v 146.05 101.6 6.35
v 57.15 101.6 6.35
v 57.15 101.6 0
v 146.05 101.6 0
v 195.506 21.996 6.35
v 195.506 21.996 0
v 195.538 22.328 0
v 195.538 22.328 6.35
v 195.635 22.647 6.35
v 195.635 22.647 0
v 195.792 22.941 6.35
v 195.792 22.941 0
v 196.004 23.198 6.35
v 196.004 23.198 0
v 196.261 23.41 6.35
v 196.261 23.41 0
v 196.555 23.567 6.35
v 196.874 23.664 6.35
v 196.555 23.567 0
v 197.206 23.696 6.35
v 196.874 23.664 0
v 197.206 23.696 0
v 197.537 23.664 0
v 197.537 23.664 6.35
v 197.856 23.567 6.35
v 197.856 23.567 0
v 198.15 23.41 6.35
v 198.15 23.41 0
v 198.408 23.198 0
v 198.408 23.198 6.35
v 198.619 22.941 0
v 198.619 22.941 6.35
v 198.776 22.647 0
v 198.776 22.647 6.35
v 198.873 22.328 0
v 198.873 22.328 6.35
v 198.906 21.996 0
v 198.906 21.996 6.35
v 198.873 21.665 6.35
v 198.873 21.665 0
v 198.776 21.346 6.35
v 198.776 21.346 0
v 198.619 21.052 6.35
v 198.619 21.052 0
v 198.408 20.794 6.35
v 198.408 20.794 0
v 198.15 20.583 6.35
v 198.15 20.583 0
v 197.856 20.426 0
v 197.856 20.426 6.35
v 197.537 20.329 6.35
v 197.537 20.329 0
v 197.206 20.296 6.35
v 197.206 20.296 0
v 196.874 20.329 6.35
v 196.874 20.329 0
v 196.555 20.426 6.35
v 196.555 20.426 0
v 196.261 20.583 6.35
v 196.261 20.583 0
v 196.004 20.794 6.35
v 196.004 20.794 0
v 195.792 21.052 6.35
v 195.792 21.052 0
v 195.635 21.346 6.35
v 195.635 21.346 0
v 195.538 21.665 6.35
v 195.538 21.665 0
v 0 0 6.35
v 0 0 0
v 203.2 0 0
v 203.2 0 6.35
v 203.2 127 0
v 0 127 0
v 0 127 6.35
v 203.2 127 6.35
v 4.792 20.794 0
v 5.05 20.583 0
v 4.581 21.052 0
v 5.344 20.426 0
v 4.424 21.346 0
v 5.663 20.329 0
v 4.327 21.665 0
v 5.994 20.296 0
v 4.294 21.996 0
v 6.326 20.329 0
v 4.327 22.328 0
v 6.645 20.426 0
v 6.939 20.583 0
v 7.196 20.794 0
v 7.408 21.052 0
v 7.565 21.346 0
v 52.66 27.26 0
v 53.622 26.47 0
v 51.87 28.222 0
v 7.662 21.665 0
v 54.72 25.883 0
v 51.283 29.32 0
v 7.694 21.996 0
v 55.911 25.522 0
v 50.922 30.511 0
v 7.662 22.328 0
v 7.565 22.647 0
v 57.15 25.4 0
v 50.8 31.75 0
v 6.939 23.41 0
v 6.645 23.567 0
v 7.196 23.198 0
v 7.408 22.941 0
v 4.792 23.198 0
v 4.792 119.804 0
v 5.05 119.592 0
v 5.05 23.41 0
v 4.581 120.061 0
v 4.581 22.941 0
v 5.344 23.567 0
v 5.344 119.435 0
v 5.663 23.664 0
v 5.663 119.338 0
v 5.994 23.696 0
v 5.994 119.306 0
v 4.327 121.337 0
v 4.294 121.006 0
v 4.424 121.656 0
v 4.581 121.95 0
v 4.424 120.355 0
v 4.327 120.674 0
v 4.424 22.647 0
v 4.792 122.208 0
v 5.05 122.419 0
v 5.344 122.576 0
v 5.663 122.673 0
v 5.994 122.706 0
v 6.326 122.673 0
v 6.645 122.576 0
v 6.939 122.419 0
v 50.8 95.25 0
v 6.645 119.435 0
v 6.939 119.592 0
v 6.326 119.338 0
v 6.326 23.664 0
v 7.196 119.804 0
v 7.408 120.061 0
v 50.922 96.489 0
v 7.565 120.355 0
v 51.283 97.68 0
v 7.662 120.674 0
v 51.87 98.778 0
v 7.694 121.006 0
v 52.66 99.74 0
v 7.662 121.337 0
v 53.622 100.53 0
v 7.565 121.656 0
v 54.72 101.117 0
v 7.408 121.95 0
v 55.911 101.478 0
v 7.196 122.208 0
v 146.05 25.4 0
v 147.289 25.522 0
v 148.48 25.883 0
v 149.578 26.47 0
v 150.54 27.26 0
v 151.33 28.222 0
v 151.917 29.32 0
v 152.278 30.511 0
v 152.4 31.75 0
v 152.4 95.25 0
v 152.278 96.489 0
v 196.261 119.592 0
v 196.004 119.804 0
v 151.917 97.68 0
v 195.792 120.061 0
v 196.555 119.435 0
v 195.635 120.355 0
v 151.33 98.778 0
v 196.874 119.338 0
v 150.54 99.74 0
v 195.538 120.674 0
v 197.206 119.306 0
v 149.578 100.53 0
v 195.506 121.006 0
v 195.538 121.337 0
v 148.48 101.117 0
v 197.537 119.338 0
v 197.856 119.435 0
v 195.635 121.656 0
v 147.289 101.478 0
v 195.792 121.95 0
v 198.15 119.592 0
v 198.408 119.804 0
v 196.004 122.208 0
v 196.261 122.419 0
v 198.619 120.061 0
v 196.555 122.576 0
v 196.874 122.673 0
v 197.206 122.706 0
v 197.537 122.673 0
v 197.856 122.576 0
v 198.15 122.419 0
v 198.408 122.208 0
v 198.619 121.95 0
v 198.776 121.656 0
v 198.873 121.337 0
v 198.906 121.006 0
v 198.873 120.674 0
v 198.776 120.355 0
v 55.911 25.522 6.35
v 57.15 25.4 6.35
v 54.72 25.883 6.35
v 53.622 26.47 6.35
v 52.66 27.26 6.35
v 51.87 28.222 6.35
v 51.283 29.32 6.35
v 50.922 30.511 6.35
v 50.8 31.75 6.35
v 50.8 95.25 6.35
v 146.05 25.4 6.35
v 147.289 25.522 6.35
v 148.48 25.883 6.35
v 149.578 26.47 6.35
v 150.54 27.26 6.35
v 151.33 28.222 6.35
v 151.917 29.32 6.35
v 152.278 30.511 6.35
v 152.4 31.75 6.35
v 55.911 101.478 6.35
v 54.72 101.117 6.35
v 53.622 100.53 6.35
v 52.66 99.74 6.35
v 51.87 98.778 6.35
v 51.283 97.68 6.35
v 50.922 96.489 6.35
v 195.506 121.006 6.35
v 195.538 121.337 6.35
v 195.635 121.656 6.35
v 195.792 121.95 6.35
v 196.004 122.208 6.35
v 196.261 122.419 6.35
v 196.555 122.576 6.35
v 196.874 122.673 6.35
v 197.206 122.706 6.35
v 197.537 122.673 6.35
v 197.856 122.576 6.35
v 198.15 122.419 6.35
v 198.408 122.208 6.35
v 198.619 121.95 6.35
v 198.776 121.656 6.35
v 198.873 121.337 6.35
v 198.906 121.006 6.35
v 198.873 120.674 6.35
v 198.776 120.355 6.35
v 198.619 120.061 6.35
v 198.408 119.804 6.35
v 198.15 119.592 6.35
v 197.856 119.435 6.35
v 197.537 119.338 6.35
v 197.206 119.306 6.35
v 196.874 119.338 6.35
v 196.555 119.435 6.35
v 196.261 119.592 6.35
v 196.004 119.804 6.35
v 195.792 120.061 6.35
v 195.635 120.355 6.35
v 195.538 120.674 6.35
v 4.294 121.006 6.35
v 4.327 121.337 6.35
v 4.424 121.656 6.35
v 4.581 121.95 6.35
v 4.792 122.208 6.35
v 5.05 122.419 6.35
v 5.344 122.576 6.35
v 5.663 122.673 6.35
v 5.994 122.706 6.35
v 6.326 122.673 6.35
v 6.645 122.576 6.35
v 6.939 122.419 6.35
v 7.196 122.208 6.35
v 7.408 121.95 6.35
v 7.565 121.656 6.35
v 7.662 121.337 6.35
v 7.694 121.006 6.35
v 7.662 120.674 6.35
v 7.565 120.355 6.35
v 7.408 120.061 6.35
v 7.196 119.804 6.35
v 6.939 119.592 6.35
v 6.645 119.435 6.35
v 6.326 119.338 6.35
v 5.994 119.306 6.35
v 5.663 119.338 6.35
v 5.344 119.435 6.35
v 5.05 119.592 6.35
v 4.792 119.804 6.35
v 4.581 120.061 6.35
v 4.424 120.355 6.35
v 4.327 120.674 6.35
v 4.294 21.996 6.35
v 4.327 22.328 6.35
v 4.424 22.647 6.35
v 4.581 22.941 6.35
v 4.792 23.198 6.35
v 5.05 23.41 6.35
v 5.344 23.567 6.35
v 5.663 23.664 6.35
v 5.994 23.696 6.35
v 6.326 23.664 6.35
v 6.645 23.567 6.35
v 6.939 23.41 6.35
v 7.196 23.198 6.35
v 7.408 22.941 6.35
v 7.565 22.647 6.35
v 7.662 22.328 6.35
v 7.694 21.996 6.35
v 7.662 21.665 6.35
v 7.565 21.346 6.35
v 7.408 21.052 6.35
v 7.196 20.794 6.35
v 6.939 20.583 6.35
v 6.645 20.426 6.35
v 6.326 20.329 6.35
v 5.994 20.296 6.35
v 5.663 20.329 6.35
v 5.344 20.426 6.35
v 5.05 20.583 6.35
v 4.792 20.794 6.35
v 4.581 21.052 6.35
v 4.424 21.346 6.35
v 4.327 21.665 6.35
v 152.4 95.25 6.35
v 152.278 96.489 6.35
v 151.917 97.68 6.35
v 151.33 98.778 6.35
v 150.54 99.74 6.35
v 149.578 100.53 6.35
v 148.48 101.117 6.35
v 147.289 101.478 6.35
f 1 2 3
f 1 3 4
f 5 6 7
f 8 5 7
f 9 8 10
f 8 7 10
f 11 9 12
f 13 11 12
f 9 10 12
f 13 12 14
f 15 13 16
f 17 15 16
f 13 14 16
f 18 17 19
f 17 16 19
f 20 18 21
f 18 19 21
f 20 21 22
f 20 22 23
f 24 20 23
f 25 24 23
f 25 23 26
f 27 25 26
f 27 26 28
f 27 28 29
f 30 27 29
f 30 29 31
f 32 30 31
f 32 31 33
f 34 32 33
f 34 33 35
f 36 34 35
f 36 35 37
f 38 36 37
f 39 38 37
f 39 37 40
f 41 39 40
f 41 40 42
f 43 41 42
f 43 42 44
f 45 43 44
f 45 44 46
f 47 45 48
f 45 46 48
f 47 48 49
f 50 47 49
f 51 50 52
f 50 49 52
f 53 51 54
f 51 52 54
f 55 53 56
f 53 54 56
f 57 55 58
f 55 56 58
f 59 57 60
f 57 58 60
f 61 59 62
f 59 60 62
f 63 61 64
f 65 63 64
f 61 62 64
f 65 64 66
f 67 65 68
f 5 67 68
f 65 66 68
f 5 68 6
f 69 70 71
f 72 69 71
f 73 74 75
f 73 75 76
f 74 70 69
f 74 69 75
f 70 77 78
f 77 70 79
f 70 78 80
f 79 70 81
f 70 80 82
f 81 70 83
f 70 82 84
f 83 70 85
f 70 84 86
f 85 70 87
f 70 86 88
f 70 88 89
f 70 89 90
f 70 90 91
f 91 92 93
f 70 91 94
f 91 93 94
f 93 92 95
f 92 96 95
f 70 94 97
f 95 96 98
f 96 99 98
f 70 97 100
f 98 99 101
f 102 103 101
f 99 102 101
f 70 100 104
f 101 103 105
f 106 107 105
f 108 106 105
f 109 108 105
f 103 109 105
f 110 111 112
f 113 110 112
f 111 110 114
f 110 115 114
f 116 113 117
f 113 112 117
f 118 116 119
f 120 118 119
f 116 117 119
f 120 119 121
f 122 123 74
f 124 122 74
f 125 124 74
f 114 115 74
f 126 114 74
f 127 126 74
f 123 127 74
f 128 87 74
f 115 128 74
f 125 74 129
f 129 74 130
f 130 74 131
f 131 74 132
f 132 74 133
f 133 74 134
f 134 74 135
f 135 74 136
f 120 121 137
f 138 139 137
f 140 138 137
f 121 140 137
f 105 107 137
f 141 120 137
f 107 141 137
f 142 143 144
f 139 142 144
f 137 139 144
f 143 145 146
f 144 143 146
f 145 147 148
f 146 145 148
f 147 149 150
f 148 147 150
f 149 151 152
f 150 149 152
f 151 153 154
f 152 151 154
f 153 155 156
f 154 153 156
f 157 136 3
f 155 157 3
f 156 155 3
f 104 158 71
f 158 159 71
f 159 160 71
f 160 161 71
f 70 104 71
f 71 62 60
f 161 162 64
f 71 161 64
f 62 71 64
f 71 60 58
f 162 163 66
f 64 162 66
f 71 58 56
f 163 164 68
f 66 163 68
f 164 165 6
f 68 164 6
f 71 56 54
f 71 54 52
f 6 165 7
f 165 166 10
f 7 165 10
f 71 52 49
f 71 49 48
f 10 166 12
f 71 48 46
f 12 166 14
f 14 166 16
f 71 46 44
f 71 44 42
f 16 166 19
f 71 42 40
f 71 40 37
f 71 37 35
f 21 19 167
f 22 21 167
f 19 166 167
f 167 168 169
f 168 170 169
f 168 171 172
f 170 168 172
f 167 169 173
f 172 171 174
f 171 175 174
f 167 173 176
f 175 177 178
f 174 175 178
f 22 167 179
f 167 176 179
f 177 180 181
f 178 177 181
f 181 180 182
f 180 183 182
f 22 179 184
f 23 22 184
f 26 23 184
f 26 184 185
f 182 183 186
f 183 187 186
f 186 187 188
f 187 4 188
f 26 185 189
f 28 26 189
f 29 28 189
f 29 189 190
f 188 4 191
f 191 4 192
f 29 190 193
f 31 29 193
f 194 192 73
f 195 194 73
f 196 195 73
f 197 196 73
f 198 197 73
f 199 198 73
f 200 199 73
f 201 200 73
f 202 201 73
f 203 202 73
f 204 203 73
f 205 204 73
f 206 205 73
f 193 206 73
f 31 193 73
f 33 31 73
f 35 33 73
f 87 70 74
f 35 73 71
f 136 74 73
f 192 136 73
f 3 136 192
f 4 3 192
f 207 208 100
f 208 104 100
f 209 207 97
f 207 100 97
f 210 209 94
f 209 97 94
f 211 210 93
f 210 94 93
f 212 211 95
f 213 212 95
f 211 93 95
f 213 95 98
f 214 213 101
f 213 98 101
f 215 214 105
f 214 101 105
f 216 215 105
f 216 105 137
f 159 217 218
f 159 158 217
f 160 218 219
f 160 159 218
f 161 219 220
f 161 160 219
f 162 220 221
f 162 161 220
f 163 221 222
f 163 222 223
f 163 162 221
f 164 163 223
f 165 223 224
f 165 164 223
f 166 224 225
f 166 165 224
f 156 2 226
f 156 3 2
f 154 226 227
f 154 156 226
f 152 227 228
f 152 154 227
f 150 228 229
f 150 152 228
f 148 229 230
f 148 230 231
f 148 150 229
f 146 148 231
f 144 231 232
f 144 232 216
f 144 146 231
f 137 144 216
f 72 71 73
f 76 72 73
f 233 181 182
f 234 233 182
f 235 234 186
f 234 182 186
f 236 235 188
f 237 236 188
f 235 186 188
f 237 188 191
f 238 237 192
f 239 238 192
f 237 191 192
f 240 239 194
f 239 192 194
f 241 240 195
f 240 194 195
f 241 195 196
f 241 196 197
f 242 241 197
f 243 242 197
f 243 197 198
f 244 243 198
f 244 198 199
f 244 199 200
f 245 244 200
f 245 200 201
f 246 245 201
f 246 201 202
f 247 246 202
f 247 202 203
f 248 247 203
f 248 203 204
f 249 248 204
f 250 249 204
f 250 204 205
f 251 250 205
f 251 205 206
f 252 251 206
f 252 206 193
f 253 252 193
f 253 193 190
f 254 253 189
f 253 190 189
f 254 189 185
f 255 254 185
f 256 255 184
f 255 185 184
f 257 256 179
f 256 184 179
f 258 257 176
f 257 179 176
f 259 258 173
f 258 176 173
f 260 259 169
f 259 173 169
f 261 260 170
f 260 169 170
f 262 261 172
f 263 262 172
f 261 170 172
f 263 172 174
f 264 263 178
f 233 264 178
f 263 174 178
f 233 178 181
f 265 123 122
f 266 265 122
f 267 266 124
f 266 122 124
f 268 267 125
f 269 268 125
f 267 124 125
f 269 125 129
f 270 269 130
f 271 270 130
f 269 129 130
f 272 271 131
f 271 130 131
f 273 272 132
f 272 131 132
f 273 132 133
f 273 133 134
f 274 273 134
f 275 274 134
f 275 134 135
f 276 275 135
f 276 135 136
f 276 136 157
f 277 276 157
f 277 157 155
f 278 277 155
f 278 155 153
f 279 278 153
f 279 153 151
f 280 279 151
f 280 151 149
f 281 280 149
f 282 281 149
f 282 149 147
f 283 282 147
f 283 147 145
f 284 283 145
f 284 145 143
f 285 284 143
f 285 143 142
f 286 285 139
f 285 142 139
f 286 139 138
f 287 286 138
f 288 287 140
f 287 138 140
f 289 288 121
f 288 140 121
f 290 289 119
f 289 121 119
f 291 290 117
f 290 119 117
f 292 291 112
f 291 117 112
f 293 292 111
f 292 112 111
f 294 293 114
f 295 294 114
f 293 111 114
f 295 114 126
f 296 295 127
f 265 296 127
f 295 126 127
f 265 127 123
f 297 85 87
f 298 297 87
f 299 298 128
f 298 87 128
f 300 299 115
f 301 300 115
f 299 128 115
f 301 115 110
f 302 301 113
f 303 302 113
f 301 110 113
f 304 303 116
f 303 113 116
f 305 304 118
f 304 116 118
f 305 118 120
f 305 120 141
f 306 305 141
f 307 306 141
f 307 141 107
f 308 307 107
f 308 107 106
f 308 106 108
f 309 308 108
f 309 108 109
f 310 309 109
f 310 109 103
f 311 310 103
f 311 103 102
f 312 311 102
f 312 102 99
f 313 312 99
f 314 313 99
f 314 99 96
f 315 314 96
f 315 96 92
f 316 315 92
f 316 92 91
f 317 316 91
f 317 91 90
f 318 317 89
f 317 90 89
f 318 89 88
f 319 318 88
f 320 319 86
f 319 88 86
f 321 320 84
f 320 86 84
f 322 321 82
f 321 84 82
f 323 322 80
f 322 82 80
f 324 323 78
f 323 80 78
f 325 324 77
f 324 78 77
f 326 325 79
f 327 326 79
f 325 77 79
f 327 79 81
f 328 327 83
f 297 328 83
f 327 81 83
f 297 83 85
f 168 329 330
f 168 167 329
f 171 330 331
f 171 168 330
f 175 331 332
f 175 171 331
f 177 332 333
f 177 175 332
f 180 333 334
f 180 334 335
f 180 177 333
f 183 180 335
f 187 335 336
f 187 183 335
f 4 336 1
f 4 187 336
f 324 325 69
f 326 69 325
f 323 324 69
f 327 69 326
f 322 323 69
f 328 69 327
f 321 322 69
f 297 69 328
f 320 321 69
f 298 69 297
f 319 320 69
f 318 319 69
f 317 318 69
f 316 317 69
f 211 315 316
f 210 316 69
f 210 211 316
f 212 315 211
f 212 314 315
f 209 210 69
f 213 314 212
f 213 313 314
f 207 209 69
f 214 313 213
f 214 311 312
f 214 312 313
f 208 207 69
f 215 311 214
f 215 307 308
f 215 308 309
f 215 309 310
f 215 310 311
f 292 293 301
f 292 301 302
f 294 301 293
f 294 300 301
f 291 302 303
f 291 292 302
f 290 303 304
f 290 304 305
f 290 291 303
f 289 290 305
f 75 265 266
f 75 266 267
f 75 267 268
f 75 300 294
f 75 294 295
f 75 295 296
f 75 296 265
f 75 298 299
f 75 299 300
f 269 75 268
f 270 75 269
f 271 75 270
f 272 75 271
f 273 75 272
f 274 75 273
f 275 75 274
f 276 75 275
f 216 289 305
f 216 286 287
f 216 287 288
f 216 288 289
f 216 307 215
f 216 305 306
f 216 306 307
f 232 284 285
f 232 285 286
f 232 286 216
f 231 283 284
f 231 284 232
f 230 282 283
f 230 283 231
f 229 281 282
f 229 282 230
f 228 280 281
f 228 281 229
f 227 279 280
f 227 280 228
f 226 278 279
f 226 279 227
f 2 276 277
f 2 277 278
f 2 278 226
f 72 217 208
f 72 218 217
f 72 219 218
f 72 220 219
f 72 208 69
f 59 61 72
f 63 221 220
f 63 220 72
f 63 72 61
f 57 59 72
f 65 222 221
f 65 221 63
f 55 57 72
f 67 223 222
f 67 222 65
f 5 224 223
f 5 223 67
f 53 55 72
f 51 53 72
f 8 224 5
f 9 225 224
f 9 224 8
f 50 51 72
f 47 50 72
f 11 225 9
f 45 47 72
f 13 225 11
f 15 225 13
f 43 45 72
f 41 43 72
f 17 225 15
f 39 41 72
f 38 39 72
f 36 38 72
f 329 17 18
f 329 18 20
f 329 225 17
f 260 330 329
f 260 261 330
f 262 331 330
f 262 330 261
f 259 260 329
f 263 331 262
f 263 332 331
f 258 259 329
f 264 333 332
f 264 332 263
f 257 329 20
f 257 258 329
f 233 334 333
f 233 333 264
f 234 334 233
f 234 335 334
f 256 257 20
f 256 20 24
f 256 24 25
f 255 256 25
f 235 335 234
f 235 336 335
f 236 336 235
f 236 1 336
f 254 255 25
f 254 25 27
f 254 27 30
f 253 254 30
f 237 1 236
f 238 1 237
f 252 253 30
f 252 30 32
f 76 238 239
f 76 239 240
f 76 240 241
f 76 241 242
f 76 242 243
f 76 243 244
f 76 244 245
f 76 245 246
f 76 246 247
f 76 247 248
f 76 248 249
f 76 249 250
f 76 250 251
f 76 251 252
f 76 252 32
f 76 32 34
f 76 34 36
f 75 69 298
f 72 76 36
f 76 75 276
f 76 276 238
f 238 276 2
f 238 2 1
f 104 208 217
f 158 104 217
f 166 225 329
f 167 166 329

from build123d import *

# Parameters (mm, degrees)
SKETCH1_W            = 203.2
SKETCH1_H            = 127
BOSS_EXTRUDE1_DEPTH  = 6.35
M3_CLEARANCE_HOLE1_D = 3.4
SKETCH6_W            = 101.6
SKETCH6_H            = 76.2
CUT_EXTRUDE3_DEPTH   = 240.70724332
FILLET1_R            = 6.35


with BuildPart() as part:
    # Sketch1 → Boss-Extrude1 (new body)
    with BuildSketch(Plane.XY):
        with Locations((101.6, 63.5)):
            Rectangle(SKETCH1_W, SKETCH1_H)
    extrude(amount=BOSS_EXTRUDE1_DEPTH)

    # M3 Clearance Hole1 (through all)
    with Locations(Plane.XY.offset(6.35)):
        with Locations((5.9944, 121.0056), (5.9944, 21.9964), (197.2056, 21.9964), (197.2056, 121.0056)):
            Hole(M3_CLEARANCE_HOLE1_D / 2)

    # Sketch6 → Cut-Extrude3 (cut, through all)
    with BuildSketch(Plane.XY.offset(6.35)):
        with Locations((101.6, 63.5)):
            Rectangle(SKETCH6_W, SKETCH6_H)
    extrude(amount=-CUT_EXTRUDE3_DEPTH, mode=Mode.SUBTRACT)

    # Fillet1
    fillet1_edges = [part.edges().sort_by_distance(p)[0] for p in [
        (152.4, 101.6, 3.175),
        (152.4, 25.4, 3.175),
        (50.8, 25.4, 3.175),
        (50.8, 101.6, 3.175),
    ]]
    fillet(fillet1_edges, radius=FILLET1_R)


solid = part.part
